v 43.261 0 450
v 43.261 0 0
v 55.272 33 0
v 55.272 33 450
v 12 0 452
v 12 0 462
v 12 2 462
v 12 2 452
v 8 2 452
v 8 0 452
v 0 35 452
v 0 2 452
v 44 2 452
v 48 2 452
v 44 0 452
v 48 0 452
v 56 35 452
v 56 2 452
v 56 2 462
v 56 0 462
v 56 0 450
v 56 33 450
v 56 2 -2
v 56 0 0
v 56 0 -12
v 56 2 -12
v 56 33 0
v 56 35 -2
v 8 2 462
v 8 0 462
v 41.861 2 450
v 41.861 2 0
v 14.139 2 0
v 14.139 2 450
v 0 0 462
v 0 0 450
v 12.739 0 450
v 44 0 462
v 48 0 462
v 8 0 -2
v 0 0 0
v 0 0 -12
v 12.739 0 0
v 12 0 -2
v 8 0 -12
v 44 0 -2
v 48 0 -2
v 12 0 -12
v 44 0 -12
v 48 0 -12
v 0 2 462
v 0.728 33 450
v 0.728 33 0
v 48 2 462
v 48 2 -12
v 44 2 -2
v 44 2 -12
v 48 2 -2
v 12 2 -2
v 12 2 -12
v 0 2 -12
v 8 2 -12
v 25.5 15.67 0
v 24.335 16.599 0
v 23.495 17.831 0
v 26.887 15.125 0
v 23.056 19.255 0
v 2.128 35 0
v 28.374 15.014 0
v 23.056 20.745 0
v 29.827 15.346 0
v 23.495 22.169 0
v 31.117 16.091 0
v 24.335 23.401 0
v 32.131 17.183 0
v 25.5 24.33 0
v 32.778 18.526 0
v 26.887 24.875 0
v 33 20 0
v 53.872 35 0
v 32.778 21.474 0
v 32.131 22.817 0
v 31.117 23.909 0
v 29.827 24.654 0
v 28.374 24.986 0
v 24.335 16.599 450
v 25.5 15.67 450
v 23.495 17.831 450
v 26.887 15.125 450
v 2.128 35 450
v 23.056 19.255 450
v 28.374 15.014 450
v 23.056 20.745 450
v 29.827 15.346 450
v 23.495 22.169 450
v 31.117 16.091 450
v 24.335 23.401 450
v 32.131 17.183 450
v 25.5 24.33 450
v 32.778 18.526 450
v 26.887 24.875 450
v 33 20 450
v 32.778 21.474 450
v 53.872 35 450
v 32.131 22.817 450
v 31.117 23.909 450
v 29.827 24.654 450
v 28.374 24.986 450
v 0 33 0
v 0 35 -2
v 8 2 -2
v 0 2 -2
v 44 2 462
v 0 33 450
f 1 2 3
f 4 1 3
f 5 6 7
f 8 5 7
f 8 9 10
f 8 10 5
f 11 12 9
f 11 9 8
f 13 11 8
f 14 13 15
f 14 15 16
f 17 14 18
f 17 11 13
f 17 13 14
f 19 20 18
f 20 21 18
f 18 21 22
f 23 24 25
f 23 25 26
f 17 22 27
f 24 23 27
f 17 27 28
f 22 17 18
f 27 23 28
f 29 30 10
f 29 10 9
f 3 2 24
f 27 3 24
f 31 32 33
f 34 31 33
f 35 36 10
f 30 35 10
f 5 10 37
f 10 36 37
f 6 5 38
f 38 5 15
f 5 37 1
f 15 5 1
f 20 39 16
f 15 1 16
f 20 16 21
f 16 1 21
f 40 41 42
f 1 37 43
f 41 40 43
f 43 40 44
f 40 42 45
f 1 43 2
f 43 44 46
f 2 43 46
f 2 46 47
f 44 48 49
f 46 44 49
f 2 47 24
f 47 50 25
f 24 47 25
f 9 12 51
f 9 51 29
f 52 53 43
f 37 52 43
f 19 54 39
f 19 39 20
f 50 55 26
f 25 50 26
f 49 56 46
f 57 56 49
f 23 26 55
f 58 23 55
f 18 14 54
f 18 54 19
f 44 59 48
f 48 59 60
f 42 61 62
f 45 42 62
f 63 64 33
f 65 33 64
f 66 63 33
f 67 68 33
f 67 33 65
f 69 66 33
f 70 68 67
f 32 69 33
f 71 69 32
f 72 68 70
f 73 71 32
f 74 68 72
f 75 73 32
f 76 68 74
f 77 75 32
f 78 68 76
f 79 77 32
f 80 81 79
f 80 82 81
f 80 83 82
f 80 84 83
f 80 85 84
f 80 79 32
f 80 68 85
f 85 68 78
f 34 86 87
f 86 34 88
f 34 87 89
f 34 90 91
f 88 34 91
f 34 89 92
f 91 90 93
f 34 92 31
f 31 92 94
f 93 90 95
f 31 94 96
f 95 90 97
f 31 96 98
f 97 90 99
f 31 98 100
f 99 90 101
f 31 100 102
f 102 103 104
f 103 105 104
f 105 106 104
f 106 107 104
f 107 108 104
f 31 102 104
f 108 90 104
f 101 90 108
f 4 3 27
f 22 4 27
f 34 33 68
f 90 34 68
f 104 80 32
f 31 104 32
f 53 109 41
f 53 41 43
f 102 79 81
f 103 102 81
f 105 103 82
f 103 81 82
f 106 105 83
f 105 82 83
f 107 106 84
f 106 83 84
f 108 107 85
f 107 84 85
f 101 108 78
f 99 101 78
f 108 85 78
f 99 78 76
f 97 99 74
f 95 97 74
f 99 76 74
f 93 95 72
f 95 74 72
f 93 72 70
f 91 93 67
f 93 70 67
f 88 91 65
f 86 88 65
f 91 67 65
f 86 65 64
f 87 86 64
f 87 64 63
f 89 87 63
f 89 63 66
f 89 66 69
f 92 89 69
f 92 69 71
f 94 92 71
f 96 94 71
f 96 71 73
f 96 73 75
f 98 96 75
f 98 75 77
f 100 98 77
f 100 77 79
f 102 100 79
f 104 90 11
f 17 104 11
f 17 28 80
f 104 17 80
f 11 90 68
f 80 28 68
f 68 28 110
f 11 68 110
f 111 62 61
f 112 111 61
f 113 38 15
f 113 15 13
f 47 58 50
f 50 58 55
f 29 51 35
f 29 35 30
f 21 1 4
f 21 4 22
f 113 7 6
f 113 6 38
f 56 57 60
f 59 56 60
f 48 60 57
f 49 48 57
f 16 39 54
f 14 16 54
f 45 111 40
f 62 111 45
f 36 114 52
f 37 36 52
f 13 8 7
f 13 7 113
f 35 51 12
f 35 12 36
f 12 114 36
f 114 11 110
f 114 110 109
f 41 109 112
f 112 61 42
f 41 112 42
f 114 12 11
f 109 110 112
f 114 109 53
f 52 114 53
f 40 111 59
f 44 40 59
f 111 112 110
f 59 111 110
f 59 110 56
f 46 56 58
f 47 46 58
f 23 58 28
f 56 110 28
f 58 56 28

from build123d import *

# Parameters (mm, degrees)
SKETCH_1_W             = 56
SKETCH_1_H             = 35
EXTRUDE_1_DEPTH        = 2
EXTRUDE_2_DEPTH        = 225
EXTRUDE_START          = -12
EXTRUDE_5_DEPTH        = 10
SKETCH_16_R            = 5
EXTRUDE_6_DEPTH        = 225
SKETCH_15_W            = 4
SKETCH_15_H            = 10
CUT_EXTRUDE_1_DEPTH    = 10
MIRROR_START           = 225
MIRROR_1_OUTLINE_R     = 5
MIRROR_1_DEPTH         = 227
MIRROR_START_2         = 450
MIRROR_1_2_OUTLINE_R   = 5
MIRROR_1_2_DEPTH       = 2
MIRROR_START_3         = 452
MIRROR_1_3_OUTLINE_W   = 32
MIRROR_1_3_OUTLINE_H   = 2
MIRROR_1_3_OUTLINE_W_2 = 8
MIRROR_1_3_DEPTH       = 10


# Read off the part's stored shape, not the designer's step: 凸台-拉伸2, 镜向1
with BuildPart() as part:
    # 草图1 (on Front Plane) → 凸台-拉伸1 (new body)
    with BuildSketch(Plane.XY):
        with Locations((28, 17.5)):
            Rectangle(SKETCH_1_W, SKETCH_1_H)
    extrude(amount=-EXTRUDE_1_DEPTH)

    # 凸台-拉伸2 outline → 凸台-拉伸2 (add)
    with BuildSketch(Plane.XY):
        Polygon((0, 35), (0, 33), (0.727940469, 33), (12.738958199, 0), (43.261041801, 0), (55.272059531, 33), (56, 33), (56, 35), (53.871644455, 35), (41.860626724, 2), (14.139373276, 2), (2.128355545, 35), align=None)
    extrude(amount=EXTRUDE_2_DEPTH)

    # 草图1<10> (on Front Plane) → 凸台-拉伸5 (add)
    with BuildSketch(Plane.XY.offset(EXTRUDE_START)):
        Polygon((28, 2), (14.139373276, 2), (14.867313744, 0), (28, 0), align=None)
        Polygon((14.139373276, 2), (12.011017731, 2), (12.738958199, 0), (14.867313744, 0), align=None)
        Polygon((12.738958199, 0), (12.011017731, 2), (0, 2), (0, 0), align=None)
        Polygon((41.860626724, 2), (28, 2), (28, 0), (41.132686256, 0), align=None)
        Polygon((56, 2), (43.988982269, 2), (43.261041801, 0), (56, 0), align=None)
        Polygon((43.988982269, 2), (41.860626724, 2), (41.132686256, 0), (43.261041801, 0), align=None)
    extrude(amount=EXTRUDE_5_DEPTH)

    # 草图16 → 凸台-拉伸6 (add)
    with BuildSketch(Plane.XY):
        with Locations((28, 20)):
            Circle(SKETCH_16_R)
    extrude(amount=EXTRUDE_6_DEPTH)

    # 草图15 → 切除-拉伸1 (cut)
    with BuildSketch(Plane(origin=(0, 2, 0), x_dir=(1, 0, 0), z_dir=(0, 1, 0))):
        with Locations((46, -457)):
            Rectangle(SKETCH_15_W, SKETCH_15_H)
        with Locations((10, 7)):
            Rectangle(SKETCH_15_W, SKETCH_15_H)
        with Locations((46, 7)):
            Rectangle(SKETCH_15_W, SKETCH_15_H)
        with Locations((10, -457)):
            Rectangle(SKETCH_15_W, SKETCH_15_H)
    extrude(amount=-CUT_EXTRUDE_1_DEPTH, mode=Mode.SUBTRACT)

    # 镜向1 outline → 镜向1 (add)
    with BuildSketch(Plane.XY.offset(MIRROR_START)):
        Polygon((43.261041801, 0), (55.272059531, 33), (56, 33), (56, 35), (53.871644455, 35), (41.860626724, 2), (14.139373276, 2), (2.128355545, 35), (0, 35), (0, 33), (0.727940469, 33), (12.738958199, 0), align=None)
        with Locations((28, 20)):
            Circle(MIRROR_1_OUTLINE_R)
    extrude(amount=MIRROR_1_DEPTH)

    # Mirror 1 2 outline → Mirror 1 2 (add)
    # profile 1 of 3: a face of its own
    with BuildSketch(Plane.XY.offset(MIRROR_START_2)):
        Polygon((14.139373276, 2), (41.860626724, 2), (53.871644455, 35), (2.128355545, 35), align=None)
        with Locations((28, 20)):
            Circle(MIRROR_1_2_OUTLINE_R, mode=Mode.SUBTRACT)
    # profile 2 of 3: a face of its own
    with BuildSketch(Plane.XY.offset(MIRROR_START_2)):
        Polygon((55.272059531, 33), (43.261041801, 0), (56, 0), (56, 33), align=None)
    # profile 3 of 3: a face of its own
    with BuildSketch(Plane.XY.offset(MIRROR_START_2)):
        Polygon((12.738958199, 0), (0.727940469, 33), (0, 33), (0, 0), align=None)
    extrude(amount=MIRROR_1_2_DEPTH)

    # Mirror 1 3 outline → Mirror 1 3 (add)
    with BuildSketch(Plane.XY.offset(MIRROR_START_3)):
        with Locations((28, 1)):
            Rectangle(MIRROR_1_3_OUTLINE_W, MIRROR_1_3_OUTLINE_H)
        with Locations((52, 1)):
            Rectangle(MIRROR_1_3_OUTLINE_W_2, MIRROR_1_3_OUTLINE_H)
        with Locations((4, 1)):
            Rectangle(MIRROR_1_3_OUTLINE_W_2, MIRROR_1_3_OUTLINE_H)
    extrude(amount=MIRROR_1_3_DEPTH)


solid = part.part
